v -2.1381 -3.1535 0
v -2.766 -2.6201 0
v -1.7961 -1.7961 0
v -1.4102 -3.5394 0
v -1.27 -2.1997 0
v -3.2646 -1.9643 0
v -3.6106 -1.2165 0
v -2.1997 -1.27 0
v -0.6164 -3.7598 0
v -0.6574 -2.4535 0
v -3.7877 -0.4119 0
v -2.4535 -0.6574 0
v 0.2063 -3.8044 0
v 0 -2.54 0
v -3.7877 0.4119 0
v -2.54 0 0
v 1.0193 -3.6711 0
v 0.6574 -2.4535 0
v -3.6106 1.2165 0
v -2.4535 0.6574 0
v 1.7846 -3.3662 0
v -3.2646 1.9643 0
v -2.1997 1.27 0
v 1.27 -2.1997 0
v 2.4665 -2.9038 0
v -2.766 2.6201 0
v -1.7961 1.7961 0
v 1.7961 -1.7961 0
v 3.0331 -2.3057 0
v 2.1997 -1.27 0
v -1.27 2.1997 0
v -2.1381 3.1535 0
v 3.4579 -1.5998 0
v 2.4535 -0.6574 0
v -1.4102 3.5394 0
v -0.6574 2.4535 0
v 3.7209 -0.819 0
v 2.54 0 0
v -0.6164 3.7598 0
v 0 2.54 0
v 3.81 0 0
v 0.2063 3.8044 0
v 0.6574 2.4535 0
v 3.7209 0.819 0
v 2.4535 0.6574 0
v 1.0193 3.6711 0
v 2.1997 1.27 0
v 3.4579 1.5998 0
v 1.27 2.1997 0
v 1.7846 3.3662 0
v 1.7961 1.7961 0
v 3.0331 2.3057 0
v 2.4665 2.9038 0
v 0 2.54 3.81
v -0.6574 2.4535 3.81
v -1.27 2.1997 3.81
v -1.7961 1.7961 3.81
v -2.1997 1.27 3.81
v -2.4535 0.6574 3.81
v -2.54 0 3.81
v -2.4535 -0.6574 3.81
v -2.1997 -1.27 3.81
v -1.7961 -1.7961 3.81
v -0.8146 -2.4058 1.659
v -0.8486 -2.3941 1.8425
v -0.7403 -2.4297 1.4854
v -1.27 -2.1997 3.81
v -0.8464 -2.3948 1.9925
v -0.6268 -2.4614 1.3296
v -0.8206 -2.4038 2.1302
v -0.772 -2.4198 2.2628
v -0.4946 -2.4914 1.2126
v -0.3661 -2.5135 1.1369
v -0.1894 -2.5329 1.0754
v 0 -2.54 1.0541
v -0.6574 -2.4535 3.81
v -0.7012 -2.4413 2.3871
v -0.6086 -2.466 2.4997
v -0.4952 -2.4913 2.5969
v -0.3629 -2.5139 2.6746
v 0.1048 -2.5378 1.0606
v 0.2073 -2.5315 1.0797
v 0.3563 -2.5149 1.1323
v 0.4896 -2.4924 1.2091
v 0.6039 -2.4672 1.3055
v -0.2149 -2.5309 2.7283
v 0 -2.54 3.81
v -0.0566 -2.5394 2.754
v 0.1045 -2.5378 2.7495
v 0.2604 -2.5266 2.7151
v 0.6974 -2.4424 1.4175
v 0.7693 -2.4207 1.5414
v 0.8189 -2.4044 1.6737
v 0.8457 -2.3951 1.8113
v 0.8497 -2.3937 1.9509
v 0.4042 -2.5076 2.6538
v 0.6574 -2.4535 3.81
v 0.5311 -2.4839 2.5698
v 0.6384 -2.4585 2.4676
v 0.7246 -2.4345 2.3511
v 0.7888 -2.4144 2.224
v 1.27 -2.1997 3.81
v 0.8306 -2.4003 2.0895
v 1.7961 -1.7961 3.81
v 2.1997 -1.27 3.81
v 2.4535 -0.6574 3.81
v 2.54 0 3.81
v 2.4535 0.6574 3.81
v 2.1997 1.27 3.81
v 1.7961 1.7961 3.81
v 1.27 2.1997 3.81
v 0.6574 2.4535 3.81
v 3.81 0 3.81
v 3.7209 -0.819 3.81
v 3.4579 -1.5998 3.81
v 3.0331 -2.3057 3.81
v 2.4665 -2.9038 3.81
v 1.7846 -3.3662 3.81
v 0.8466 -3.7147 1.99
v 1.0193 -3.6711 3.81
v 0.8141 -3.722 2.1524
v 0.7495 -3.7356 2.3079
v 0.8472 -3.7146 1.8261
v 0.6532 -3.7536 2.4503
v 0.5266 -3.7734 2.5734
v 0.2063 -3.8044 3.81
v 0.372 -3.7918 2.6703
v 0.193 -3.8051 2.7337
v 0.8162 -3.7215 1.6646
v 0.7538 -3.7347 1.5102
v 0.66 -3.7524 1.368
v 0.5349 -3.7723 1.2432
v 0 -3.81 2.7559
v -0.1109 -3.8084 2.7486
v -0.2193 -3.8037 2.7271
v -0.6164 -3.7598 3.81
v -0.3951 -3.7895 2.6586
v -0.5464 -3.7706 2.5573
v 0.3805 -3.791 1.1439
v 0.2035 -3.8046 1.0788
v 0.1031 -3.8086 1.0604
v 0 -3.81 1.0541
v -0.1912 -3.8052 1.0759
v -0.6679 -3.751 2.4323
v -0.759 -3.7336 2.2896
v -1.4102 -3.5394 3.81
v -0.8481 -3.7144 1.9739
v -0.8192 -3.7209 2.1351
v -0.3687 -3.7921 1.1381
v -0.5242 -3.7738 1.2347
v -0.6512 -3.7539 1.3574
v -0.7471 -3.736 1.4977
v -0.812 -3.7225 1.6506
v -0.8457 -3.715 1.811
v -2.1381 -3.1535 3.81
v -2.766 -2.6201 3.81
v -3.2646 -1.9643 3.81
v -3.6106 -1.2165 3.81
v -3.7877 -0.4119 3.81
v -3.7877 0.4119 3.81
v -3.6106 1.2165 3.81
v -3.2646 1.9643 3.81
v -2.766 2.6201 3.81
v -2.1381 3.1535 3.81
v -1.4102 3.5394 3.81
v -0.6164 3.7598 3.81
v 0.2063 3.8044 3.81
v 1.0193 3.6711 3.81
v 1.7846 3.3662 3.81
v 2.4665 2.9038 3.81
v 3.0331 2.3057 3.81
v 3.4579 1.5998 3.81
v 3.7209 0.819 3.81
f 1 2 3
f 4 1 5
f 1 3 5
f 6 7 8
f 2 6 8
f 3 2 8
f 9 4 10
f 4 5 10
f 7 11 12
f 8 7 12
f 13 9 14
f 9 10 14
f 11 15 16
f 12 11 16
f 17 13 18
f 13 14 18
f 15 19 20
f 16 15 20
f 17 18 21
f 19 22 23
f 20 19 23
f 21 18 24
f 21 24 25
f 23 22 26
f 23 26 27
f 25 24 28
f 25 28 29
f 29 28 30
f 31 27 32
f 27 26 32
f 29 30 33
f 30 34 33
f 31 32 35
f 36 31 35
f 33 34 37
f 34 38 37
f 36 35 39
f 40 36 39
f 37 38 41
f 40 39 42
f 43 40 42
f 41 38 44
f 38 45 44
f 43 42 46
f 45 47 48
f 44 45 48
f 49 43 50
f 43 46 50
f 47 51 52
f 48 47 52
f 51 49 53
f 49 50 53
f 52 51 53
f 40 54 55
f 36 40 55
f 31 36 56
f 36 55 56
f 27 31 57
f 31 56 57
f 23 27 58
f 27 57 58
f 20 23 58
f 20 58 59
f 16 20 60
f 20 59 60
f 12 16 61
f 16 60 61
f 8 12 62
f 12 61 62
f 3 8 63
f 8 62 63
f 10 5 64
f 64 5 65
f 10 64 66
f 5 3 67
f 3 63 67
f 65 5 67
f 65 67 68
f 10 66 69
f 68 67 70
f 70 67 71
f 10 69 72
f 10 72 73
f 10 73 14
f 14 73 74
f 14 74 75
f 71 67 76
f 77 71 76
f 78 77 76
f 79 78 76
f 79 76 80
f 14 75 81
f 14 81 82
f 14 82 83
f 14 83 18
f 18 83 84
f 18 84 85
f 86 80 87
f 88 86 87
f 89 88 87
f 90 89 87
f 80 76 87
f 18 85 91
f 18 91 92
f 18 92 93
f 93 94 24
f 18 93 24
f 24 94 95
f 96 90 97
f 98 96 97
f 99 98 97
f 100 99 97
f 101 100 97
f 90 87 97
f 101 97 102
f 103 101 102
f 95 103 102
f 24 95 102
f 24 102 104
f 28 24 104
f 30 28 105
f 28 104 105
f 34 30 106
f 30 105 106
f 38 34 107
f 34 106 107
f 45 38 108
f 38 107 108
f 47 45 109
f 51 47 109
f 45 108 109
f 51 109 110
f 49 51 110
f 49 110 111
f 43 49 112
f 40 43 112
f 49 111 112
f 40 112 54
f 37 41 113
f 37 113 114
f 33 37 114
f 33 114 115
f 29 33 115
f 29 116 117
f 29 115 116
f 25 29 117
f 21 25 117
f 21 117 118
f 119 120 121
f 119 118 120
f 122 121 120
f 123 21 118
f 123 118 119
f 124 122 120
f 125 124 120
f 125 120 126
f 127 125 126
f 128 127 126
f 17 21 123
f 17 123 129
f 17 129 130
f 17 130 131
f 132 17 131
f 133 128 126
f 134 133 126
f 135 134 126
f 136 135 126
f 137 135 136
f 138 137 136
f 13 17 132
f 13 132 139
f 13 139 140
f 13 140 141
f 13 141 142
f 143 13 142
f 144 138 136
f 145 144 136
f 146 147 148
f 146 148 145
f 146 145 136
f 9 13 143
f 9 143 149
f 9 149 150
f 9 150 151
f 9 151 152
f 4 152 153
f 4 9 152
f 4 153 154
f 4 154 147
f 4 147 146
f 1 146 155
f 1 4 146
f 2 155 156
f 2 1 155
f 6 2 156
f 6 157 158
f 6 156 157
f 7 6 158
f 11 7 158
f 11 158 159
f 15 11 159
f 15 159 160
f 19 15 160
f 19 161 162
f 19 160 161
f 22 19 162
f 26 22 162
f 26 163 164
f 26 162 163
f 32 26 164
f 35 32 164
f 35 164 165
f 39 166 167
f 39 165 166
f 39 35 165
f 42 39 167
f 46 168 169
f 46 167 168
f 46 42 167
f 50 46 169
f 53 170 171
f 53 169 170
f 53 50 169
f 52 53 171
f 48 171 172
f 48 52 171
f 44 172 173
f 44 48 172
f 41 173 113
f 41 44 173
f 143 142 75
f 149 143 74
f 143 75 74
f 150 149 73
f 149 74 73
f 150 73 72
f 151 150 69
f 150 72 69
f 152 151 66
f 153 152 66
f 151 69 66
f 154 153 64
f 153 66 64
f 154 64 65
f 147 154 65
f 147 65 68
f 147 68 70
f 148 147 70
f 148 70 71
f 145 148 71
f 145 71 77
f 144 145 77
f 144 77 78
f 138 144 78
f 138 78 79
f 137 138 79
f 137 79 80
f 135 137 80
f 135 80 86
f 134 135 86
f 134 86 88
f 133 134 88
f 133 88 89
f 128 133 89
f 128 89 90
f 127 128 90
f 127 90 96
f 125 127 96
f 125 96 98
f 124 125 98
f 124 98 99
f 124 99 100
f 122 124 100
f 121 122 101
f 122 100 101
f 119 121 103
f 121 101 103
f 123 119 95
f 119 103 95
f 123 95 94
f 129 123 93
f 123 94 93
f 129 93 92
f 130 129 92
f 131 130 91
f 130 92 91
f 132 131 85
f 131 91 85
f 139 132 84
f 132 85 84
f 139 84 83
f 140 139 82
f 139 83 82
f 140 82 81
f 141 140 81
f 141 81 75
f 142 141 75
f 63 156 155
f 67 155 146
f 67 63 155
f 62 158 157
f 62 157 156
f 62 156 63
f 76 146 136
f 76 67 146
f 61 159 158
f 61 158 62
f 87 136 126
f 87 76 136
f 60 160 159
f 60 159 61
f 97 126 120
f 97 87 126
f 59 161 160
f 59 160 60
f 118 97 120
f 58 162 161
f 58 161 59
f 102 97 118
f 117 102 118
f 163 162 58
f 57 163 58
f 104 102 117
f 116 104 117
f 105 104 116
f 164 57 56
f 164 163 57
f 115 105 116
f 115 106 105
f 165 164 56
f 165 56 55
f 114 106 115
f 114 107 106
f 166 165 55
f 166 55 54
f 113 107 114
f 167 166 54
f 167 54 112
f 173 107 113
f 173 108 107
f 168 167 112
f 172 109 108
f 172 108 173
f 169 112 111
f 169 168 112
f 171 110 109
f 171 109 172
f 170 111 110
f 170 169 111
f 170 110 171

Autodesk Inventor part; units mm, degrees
ref_plane "YZ Plane" through (0, 0, 0) normal (1, 0, 0) x (0, 1, 0)
ref_plane "XY Plane" through (0, 0, 0) normal (0, 0, 1) x (1, 0, 0)
sketch "Sketch1" plane through (0, 0, 0) normal (0, 0, 1) x (1, 0, 0)
  circle A0 centre (0, 0) radius 3.81
  dimension "d0" = 7.62
extrude "Extrusion1" add sketch "Sketch1" along normal blind 3.81
hole "Hole1" at (0, 0, 0) direction (0, 0, 1) diameter 5.08 end through all
ref_plane "Work Plane1" through (0, 0, 3.81) normal (0, 0, -1) x (-1, 0, 0)
ref_plane "Work Plane2" through (0, -3.81, 0) normal (0, -1, 0) x (1, 0, 0)
sketch "Sketch2" plane through (0, -3.81, 0) normal (0, -1, 0) x (1, 0, 0)
  point P0 (0, 0)
sketch "Sketch3" plane through (0, -3.81, 0) normal (0, -1, 0) x (1, 0, 0)
  line L0 (-3.81, 3.81) -> (3.81, 3.81) projected
  line L1 (-3.81, 0) -> (3.81, 0) projected
  line L2 (0, -0.762) -> (0, 4.572) projected
  line L3 (0, 3.81) -> (0, 0)
  point P0 (0, 1.905)
  dimension "d15" = 1.905
hole "Hole2" at (0, -3.81, 1.905) direction (0, 1, 0) diameter 1.7018 depth 3.81
equation "\"d12\" = -d1"
equation "\"d1\" = 3.81"
properties part number "Jig_Aligner_Sleeve"
